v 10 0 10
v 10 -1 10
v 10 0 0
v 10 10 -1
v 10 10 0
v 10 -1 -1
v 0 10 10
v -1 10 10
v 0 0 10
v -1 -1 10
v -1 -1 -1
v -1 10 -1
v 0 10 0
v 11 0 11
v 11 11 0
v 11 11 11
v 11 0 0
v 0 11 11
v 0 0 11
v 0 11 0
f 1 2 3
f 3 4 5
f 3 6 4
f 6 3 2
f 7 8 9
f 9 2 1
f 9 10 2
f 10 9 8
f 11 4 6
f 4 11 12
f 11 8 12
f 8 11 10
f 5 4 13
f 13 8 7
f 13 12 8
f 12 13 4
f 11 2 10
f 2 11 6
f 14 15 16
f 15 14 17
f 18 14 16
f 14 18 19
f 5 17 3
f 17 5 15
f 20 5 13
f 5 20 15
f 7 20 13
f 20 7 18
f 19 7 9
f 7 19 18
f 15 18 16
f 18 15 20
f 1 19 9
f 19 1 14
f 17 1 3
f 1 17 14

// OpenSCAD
// Unit of length: Unit.MM
union()
{
   color(c = [1.0, 0.0, 0.0, 1.0])
   {
      translate(v = [-1.0, -1.0, -1.0])
      {
         cube(size = 11.0, center = false);
      }
   }
   cube(size = 11.0, center = false);
}
